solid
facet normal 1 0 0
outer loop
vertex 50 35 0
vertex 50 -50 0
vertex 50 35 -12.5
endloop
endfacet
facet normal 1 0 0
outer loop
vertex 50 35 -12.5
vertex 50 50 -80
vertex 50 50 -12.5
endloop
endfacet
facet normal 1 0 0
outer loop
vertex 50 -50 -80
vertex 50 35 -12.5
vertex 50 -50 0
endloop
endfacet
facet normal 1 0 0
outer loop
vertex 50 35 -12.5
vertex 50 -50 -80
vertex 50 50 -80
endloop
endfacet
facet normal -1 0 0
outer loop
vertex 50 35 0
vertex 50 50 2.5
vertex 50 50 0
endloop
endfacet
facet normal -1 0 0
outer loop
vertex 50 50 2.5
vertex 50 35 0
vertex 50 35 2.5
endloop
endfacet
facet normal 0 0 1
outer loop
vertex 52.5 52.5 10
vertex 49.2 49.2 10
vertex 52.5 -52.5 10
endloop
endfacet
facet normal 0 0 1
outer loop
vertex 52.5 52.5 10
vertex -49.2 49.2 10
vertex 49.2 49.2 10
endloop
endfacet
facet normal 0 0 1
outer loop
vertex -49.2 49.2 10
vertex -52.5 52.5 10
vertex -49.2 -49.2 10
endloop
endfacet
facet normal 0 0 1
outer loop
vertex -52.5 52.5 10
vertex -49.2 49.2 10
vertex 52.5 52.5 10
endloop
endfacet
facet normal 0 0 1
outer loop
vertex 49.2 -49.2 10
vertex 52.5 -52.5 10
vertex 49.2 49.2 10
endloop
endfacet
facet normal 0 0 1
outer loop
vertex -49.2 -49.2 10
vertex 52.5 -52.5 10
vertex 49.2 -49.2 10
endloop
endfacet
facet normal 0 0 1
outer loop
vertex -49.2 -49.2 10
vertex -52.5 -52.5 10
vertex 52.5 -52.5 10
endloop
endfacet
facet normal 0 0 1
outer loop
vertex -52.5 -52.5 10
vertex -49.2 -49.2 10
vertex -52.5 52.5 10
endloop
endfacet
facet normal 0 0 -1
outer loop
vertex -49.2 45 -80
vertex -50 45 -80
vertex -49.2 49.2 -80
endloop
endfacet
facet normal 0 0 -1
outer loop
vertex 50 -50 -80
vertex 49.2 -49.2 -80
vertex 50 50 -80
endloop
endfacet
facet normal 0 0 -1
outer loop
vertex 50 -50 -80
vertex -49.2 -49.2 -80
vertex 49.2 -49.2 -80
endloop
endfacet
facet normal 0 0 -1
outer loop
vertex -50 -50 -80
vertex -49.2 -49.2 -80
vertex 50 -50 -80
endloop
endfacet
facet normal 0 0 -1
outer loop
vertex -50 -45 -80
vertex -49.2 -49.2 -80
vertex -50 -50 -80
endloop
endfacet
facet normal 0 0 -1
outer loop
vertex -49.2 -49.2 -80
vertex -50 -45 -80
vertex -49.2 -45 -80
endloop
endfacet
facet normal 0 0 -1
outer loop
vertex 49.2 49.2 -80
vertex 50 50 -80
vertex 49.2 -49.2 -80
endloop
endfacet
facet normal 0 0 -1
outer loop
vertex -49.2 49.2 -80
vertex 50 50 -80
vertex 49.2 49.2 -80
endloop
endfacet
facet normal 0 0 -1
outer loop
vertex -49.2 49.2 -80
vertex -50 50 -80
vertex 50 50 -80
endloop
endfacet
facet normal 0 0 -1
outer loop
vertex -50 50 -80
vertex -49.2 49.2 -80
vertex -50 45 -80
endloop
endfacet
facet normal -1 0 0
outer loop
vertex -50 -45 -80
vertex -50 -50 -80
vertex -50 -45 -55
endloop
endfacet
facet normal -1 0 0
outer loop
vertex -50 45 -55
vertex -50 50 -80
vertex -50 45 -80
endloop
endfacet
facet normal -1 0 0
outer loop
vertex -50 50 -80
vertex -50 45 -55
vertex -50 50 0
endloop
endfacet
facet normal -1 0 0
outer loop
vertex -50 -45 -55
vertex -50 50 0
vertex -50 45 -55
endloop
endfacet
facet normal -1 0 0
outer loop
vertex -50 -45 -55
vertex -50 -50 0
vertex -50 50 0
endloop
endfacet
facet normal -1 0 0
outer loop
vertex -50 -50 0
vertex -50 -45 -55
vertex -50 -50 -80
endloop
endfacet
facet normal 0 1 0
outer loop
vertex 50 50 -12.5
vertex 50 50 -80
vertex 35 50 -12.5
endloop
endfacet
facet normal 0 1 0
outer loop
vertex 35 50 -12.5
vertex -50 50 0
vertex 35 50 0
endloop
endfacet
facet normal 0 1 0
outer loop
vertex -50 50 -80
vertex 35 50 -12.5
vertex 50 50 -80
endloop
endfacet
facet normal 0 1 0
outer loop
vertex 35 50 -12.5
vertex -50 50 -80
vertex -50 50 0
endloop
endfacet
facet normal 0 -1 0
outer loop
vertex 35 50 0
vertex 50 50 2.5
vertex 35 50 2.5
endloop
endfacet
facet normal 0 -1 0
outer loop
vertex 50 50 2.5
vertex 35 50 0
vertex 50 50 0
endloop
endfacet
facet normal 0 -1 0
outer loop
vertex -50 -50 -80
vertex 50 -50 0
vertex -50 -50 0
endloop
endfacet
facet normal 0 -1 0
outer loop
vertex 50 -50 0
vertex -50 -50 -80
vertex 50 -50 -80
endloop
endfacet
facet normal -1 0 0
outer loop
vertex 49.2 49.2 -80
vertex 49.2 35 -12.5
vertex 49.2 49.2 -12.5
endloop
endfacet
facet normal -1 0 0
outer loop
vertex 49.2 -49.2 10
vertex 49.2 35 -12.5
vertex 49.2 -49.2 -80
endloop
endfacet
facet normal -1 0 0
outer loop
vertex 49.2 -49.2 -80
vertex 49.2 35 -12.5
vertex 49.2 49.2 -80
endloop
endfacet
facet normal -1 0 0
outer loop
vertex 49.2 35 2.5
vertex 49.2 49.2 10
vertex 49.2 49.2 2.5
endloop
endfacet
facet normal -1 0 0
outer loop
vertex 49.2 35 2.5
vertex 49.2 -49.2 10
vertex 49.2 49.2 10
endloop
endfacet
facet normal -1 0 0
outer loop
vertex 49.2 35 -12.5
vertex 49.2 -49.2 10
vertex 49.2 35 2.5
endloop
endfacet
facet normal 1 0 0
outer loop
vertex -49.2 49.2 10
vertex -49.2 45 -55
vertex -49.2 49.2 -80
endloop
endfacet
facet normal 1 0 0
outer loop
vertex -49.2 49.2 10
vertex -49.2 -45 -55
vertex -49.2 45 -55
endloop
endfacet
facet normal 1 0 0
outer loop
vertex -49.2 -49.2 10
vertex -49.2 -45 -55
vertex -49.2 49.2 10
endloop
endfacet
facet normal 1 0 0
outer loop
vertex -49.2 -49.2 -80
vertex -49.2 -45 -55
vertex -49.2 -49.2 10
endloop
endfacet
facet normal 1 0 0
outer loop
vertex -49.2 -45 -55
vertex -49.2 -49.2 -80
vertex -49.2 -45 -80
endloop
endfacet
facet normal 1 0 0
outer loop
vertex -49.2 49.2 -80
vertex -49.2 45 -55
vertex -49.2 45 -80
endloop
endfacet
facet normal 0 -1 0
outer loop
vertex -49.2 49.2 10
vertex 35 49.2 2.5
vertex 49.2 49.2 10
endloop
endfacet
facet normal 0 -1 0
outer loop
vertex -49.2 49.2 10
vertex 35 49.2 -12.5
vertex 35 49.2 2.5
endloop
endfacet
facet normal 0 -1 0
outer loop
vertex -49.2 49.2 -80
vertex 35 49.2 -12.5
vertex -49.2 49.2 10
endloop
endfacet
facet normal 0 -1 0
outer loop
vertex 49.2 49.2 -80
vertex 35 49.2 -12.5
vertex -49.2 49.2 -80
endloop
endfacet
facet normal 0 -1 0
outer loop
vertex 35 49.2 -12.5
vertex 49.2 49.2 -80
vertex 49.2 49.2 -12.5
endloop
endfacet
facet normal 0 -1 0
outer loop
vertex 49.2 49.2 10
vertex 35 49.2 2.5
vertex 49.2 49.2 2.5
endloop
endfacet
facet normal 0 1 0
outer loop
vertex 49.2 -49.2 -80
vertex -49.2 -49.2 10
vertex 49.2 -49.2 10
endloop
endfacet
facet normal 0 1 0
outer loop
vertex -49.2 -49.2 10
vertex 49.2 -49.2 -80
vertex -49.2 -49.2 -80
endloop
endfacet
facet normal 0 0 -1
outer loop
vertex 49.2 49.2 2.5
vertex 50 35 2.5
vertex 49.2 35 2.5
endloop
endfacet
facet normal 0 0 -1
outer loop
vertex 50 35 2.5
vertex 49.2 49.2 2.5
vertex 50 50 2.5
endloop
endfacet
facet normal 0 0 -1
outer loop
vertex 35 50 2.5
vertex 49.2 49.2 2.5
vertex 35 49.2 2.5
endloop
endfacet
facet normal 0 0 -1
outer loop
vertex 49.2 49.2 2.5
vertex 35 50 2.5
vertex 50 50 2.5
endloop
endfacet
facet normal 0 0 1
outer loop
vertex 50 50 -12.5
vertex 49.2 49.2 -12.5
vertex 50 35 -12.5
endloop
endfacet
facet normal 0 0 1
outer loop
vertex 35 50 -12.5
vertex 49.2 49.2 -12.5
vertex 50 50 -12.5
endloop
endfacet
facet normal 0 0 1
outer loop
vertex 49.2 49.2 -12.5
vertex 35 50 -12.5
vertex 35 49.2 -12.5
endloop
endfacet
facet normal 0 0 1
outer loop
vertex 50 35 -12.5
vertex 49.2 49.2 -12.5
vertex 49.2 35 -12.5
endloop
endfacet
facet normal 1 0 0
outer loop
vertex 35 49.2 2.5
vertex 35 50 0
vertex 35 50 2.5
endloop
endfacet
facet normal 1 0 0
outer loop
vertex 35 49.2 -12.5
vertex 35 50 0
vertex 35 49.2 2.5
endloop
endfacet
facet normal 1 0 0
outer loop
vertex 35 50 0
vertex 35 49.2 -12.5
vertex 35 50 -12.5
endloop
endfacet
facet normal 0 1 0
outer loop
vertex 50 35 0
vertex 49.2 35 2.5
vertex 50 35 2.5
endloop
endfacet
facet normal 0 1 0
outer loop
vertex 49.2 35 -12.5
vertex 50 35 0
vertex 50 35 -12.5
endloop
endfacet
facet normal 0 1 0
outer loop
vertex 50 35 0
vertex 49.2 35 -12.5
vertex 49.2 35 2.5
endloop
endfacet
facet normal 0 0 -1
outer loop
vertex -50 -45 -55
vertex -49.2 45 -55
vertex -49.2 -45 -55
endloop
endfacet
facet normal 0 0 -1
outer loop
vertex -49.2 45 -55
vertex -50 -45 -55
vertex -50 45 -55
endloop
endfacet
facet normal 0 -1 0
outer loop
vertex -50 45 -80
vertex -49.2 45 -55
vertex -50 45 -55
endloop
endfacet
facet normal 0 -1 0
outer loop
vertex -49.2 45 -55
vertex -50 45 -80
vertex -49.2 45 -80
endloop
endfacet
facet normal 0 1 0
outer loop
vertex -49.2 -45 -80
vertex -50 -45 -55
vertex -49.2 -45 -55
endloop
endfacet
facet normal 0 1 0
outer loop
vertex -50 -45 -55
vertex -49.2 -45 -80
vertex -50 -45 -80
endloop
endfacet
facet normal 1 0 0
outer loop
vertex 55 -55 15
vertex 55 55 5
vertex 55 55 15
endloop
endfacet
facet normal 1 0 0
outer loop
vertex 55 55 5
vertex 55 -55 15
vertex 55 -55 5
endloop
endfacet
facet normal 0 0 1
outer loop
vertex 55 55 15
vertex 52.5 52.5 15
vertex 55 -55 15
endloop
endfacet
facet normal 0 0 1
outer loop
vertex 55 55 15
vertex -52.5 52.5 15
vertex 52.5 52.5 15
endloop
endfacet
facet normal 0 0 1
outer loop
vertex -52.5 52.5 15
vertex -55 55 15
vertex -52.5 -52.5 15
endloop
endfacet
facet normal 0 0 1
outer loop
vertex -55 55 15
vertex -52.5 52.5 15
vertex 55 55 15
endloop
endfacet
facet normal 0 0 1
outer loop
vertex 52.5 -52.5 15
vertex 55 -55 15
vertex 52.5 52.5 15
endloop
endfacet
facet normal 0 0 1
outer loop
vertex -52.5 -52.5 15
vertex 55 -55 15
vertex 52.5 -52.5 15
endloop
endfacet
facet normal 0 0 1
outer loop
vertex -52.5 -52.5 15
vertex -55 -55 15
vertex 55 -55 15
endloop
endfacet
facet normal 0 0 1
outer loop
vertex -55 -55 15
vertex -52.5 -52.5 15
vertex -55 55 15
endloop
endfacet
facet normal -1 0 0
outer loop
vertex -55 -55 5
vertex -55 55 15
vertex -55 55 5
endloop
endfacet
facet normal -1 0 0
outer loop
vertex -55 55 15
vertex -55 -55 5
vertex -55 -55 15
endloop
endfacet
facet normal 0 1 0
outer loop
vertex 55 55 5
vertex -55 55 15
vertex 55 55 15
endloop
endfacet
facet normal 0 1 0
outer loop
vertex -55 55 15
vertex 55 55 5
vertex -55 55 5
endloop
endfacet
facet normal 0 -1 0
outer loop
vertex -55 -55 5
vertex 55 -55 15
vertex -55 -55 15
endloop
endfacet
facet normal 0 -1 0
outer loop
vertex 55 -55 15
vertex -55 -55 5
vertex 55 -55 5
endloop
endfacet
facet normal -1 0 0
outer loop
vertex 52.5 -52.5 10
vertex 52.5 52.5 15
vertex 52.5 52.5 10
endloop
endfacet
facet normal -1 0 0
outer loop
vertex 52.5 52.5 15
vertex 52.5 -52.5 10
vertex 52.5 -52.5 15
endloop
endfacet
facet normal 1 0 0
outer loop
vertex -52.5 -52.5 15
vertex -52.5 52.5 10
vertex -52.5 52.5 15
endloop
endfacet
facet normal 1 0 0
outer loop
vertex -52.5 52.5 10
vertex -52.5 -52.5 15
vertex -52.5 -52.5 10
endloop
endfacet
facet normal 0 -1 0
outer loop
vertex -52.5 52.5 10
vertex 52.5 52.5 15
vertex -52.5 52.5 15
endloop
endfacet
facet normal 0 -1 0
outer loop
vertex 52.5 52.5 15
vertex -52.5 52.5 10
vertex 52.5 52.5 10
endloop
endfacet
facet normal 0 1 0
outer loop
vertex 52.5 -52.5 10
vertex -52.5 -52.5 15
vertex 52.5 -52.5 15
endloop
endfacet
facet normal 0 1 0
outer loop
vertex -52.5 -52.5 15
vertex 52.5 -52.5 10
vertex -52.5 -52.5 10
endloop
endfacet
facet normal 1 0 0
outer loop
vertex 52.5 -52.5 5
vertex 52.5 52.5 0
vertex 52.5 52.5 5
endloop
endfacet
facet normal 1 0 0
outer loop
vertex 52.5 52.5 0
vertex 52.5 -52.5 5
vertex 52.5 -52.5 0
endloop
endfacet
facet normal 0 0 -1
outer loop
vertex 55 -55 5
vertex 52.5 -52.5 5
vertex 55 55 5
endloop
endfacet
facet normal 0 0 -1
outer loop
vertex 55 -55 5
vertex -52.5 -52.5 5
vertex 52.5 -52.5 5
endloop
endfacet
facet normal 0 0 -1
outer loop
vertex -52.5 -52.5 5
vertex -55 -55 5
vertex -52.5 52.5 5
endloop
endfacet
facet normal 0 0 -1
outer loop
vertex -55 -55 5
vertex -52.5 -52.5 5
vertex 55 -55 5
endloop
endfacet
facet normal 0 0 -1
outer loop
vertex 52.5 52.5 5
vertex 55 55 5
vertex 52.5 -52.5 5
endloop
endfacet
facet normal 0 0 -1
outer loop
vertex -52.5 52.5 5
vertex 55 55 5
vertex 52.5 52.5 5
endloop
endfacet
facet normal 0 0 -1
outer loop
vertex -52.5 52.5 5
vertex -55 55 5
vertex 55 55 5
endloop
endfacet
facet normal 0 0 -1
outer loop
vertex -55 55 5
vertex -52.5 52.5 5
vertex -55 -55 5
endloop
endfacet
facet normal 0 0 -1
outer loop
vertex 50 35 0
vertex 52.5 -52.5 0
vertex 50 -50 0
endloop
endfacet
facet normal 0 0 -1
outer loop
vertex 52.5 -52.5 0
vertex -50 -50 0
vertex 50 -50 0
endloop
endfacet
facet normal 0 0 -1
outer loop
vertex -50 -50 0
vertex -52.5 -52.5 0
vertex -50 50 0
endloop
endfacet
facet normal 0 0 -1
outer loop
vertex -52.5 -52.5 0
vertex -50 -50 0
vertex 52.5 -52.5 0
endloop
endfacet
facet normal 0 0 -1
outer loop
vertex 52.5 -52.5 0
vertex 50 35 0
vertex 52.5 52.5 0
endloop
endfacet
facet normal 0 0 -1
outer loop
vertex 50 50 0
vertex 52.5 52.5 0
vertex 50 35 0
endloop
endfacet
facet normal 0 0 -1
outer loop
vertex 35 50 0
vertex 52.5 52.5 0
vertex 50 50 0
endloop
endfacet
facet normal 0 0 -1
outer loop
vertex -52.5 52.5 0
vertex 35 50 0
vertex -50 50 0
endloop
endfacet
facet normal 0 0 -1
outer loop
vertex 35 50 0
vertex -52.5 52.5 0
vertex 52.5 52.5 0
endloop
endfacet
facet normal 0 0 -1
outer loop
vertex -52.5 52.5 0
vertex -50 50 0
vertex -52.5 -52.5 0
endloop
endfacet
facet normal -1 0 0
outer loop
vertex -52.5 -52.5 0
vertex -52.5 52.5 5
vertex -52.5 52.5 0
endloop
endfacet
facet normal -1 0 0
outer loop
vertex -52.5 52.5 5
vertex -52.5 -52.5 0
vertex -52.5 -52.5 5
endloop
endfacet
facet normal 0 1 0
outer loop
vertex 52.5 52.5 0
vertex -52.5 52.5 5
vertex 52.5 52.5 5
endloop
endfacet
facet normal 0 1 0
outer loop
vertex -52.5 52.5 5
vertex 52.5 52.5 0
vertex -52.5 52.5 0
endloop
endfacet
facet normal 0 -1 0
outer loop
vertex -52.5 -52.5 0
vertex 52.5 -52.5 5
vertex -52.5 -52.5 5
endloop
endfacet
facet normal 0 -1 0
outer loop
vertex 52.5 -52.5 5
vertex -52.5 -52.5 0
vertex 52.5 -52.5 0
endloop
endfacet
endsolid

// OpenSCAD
petri_diameter = 80;  // Диаметр чашки Петри

box_width = 100;      // Внутренняя ширина коробки
box_height = 60;      // Внутренняя высота коробки
wall_thickness = 5;   // Толщина стенки
bottom_thickness = 5; // Толщина дна

cap_width = 100;
border_width = box_width - cap_width;
border_height = 10 - 5;

slot_height = 5;
slot_width = slot_height / 2;

doorslot_width = 5;
doorslot_depth = 2.1;
doorslot_thickness = 4;
door_width = 100;
door_height = box_height;
eps = 0.02;

// --- Параметры отверстия в углу ---
hole_size = 15;              // Размер отверстия (мм)
hole_dist_from_top = 15;     // Отступ от верха трубы до центра отверстия (мм)

// --- Параметры ПРЯМОУГОЛЬНОГО отверстия внизу стенки ---
lower_hole_width = 90;       // Ширина отверстия (по X)
lower_hole_height = 25;      // Высота отверстия (по Z)
lower_hole_from_bottom = 0;  // Отступ от дна до нижнего края отверстия
lower_hole_center_x = 0;     // Смещение центра отверстия по X (0 = по центру)

// Параметры трубы
outer_size = 100;
aperture_height = 90;
aperture_thickness = 0.8;    
    
inner_size = outer_size - 2 * aperture_thickness;

// === МОДУЛЬ КОЛЬЦА ===
module lighting_ring() {
    bot_out_width = box_width + 2 * wall_thickness;
    bot_in_width = box_width;
    top_out_width = bot_out_width - border_width;
    top_in_width = bot_in_width - border_width;
    
    translate([0, 0, border_height + slot_height * 3 / 2])
    difference() {
        cube([top_out_width, top_out_width, slot_height], center = true);
        cube([top_in_width + 2 * slot_width, top_in_width + 2 * slot_width, slot_height + eps], center = true);
    }
    translate([0, 0, slot_height / 2])
    difference() {
        cube([bot_in_width + 2 * slot_width, bot_in_width + 2 * slot_width, slot_height], center = true);
        cube([bot_in_width, bot_in_width, slot_height + eps], center = true);
    }
    translate([0, 0, slot_height])
    difference() {
        linear_extrude(height = border_height, center = false, scale = top_out_width / bot_out_width)
            square([bot_out_width, bot_out_width], center = true);
        translate([0, 0, -eps])
        linear_extrude(height = border_height + 2 * eps, center = false, scale = top_in_width / bot_in_width)
            square([bot_in_width, bot_in_width], center = true);
    }
}

// === СБОРКА ===
translate([0, 0, -aperture_height / 2 + 10])
difference() {
    // Внешний корпус трубы
    cube([outer_size, outer_size, aperture_height], center = true);
    
    // Внутренняя полость
    cube([inner_size, inner_size, aperture_height + 20], center = true);
    
    // 🔌 ОТВЕРСТИЕ В УГЛУ (передний правый угол)
    translate([
        outer_size / 2 - hole_size / 2, 
        outer_size / 2 - hole_size / 2,
        aperture_height / 2 - hole_dist_from_top
    ])
    cube([hole_size, hole_size, hole_size], center = true);
    
    // 🔻 ПРЯМОУГОЛЬНОЕ ОТВЕРСТИЕ НА ЛЕВОЙ СТЕНКЕ
    translate([
        -outer_size / 2,                                          // X: левая грань
        lower_hole_center_x,                                      // Y: смещение вдоль стенки (0 = по центру)
        -aperture_height / 2 + lower_hole_from_bottom + lower_hole_height / 2  // Z: центр по вертикали
    ])
    cube([
        aperture_thickness + 2,               // Толщина (с запасом) по X
        lower_hole_width,                     // Ширина по Y
        lower_hole_height                     // Высота по Z
    ], center = true);
}

// Устанавливаем кольцо сверху
lighting_ring();
